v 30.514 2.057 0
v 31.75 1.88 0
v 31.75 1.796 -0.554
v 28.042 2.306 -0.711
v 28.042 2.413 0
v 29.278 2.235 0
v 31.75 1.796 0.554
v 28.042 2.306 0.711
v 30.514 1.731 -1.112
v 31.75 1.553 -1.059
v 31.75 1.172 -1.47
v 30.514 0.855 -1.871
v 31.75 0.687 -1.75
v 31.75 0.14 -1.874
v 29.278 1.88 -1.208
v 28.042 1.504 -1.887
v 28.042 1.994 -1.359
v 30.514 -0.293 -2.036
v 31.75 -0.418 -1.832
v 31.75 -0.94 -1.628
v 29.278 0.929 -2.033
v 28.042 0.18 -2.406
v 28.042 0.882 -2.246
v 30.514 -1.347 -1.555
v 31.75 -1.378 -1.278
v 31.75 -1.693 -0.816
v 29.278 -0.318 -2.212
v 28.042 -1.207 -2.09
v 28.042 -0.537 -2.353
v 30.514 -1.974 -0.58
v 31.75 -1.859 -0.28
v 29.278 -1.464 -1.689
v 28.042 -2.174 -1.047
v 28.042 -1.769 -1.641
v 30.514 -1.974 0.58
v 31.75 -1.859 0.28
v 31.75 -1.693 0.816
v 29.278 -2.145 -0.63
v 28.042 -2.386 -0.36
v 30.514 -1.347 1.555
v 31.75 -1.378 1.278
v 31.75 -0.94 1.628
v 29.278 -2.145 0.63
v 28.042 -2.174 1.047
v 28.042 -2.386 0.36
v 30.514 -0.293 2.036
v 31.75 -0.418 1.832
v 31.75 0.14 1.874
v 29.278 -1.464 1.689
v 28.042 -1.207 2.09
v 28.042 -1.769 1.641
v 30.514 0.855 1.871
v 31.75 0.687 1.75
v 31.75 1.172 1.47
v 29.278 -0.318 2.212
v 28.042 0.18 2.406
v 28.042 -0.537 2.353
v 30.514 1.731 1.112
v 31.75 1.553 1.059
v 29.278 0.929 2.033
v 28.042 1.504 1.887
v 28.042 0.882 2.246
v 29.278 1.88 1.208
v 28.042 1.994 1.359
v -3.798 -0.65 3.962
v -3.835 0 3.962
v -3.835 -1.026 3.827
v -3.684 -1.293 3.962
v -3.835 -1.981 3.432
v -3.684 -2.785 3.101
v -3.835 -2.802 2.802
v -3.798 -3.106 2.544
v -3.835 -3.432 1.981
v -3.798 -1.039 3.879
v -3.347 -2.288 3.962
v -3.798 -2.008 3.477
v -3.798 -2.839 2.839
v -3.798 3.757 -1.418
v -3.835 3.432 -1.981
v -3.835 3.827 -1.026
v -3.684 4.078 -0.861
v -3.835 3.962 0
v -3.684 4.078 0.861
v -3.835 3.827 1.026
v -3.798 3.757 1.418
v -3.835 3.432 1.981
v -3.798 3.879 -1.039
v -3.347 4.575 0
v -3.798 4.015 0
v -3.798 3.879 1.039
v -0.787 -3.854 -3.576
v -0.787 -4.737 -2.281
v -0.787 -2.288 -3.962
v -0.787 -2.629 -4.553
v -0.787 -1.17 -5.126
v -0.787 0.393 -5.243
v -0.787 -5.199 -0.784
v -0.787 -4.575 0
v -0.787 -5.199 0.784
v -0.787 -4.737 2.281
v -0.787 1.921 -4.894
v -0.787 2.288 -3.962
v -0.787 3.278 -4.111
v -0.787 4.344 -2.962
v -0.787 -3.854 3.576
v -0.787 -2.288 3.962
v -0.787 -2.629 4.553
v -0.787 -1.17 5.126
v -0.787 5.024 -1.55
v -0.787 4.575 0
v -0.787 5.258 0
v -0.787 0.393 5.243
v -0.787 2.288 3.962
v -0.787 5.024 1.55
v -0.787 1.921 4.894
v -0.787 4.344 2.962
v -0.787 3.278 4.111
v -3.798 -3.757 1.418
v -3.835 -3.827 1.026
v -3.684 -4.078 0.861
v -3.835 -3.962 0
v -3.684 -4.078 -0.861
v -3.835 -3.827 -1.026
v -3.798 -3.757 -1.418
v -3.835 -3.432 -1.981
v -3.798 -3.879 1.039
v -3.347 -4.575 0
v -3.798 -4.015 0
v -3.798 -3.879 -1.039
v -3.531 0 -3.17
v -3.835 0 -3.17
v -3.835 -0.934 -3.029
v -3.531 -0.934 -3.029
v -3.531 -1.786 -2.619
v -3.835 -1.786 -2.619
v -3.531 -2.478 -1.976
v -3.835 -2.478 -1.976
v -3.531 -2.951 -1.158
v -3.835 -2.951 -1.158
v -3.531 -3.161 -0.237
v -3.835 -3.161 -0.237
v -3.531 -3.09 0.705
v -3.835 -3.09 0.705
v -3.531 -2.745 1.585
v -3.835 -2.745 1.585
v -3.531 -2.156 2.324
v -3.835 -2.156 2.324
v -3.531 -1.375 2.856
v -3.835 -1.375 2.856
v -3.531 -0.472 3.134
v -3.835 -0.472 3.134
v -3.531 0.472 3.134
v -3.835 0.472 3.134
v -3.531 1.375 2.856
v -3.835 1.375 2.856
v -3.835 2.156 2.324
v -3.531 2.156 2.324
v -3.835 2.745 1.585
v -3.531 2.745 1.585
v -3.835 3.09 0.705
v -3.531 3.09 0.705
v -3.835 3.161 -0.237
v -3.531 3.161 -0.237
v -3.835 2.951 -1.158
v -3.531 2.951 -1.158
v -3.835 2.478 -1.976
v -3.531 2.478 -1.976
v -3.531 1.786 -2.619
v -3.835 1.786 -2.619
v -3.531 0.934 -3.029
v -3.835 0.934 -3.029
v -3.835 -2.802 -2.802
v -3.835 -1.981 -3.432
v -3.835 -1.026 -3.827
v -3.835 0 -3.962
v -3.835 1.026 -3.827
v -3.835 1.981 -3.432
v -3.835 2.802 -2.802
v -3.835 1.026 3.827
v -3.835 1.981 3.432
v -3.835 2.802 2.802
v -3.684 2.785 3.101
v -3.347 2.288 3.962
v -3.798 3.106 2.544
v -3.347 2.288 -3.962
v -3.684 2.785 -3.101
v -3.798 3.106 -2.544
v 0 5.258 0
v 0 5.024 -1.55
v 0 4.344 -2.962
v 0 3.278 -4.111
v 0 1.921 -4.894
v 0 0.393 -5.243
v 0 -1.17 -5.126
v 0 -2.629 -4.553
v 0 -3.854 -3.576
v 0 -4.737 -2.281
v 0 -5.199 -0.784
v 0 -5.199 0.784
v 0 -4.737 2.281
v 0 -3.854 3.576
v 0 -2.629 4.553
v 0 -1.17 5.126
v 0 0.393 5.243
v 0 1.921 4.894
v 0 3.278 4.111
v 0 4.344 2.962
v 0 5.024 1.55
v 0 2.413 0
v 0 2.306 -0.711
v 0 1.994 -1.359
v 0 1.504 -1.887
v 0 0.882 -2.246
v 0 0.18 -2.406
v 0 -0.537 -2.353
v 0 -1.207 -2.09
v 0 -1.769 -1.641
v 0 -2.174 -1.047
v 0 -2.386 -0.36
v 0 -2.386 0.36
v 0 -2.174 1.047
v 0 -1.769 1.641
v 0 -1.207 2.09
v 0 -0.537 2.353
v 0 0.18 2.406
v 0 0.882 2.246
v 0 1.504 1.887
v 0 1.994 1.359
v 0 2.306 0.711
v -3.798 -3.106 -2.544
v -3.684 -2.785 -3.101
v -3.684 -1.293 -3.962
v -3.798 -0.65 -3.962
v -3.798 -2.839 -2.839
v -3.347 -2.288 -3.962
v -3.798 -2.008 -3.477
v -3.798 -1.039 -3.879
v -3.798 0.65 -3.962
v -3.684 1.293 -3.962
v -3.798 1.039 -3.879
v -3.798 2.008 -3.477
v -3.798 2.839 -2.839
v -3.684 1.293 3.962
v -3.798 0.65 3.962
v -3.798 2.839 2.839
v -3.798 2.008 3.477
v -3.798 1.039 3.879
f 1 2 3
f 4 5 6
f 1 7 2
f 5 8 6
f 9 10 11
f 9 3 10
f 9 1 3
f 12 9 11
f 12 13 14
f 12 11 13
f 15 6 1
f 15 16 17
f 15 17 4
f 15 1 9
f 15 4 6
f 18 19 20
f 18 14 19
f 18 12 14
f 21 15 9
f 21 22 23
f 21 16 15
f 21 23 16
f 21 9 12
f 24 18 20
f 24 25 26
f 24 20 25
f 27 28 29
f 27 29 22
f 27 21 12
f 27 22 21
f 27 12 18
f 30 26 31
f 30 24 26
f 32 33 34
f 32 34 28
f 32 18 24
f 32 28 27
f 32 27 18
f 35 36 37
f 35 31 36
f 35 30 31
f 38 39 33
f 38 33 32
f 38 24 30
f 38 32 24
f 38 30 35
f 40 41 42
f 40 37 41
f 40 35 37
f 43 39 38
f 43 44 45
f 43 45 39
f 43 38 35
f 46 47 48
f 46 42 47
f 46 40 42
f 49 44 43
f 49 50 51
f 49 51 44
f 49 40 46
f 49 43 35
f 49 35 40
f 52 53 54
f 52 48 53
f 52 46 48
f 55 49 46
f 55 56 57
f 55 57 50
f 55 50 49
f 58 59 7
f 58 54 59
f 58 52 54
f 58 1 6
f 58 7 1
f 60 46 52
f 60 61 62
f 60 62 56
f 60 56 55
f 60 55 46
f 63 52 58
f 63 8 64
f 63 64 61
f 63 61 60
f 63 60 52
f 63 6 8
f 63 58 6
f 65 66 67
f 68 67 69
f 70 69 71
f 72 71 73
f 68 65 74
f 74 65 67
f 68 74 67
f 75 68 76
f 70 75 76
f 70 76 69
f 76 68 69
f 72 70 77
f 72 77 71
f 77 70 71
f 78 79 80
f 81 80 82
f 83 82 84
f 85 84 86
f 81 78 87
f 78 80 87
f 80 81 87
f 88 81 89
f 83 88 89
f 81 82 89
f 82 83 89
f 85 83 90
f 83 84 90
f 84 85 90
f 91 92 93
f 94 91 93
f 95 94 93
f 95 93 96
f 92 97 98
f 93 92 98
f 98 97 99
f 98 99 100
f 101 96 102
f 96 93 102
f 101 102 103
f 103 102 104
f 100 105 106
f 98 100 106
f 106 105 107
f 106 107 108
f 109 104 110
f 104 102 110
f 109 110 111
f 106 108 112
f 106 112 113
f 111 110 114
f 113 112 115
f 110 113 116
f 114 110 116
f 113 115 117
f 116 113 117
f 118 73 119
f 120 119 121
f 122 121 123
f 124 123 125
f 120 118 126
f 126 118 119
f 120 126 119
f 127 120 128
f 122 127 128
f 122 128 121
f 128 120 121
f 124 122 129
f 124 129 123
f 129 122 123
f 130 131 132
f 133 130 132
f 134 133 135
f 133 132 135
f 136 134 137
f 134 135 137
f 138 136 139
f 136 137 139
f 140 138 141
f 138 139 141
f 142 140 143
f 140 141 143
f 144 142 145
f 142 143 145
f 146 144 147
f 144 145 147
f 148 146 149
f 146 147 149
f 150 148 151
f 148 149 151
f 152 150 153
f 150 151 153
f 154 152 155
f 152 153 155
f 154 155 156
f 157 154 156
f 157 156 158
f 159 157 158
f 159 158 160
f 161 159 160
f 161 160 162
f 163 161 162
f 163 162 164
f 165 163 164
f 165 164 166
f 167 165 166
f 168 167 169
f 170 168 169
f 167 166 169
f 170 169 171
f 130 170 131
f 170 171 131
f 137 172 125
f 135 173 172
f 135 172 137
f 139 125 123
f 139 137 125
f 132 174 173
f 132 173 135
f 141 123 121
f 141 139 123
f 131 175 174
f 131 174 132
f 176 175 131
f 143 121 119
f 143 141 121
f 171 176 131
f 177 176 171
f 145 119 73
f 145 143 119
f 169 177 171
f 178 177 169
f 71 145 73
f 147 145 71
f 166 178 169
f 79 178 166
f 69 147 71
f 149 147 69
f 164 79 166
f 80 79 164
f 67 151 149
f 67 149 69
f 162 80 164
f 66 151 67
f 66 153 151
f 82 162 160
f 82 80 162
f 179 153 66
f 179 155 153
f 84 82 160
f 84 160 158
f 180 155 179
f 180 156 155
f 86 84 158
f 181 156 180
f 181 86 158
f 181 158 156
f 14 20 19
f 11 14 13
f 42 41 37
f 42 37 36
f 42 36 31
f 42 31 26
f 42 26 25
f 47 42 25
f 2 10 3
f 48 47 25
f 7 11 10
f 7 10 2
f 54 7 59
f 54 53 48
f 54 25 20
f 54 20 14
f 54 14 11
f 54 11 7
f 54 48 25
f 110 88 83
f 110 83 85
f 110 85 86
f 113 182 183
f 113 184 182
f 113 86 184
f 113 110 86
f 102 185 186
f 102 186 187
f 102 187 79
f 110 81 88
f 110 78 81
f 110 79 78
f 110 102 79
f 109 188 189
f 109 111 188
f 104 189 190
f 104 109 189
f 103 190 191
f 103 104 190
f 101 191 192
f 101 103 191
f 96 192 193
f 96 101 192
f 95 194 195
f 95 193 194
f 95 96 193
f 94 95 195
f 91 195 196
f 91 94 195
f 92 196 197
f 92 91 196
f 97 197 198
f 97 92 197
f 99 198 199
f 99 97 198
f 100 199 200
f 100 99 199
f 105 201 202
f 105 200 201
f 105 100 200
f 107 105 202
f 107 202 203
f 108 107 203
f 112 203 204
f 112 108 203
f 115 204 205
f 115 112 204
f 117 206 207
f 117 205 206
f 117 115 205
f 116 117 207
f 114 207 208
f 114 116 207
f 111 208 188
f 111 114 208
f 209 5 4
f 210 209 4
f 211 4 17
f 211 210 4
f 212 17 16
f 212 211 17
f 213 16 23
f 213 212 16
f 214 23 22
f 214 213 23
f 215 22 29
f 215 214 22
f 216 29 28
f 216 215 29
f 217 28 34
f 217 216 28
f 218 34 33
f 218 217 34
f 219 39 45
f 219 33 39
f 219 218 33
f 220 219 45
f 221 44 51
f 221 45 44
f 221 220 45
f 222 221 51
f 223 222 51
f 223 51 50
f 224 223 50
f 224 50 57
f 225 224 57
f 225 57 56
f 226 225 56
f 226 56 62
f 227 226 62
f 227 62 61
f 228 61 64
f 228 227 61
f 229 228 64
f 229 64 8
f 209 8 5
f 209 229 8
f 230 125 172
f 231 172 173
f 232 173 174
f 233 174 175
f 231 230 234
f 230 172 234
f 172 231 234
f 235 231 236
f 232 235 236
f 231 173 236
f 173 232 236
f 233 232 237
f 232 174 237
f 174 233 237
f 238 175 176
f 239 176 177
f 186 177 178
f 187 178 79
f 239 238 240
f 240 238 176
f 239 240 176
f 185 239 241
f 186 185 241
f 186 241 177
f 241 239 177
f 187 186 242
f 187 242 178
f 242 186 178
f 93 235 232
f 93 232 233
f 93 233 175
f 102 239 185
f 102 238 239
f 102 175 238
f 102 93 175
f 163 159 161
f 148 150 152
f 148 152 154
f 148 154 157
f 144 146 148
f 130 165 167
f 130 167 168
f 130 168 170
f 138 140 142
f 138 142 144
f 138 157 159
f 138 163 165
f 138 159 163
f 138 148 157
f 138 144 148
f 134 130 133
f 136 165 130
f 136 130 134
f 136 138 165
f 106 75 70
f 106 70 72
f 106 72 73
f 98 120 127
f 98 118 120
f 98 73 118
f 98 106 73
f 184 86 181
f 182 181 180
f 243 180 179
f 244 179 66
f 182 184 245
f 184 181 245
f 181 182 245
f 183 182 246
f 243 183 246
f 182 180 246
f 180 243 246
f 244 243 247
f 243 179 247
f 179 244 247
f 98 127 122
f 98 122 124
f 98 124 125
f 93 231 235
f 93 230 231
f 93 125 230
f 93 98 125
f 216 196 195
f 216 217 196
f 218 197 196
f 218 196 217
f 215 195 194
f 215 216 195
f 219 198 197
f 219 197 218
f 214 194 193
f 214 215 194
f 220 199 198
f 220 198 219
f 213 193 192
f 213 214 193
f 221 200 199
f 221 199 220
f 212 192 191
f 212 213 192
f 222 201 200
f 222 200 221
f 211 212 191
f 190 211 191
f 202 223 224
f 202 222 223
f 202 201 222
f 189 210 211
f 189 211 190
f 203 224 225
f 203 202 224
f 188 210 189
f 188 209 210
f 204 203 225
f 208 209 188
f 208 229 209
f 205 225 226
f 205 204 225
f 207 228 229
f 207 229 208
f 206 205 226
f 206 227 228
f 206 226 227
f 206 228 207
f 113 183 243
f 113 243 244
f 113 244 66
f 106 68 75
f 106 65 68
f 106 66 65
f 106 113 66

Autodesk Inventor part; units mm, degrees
ref_plane "YZ Plane" through (0, 0, 0) normal (1, 0, 0) x (0, 1, 0)
sketch "Sketch1" plane through (0, 0, 0) normal (0, 0, 1) x (1, 0, 0)
  line L0 (-0.7874, 5.2578) -> (-0.7874, 0)
  line L1 (-0.7874, 0) -> (31.75, 0)
  line L2 (31.75, 0) -> (31.75, 2.413)
  line L3 (31.75, 2.413) -> (0, 2.413)
  line L4 (0, 2.413) -> (0, 5.2578)
  line L5 (-7.2949, 0) -> (38.2575, 0) projected
  line L6 (0, -1.0516) -> (0, 6.3094) projected
  line L7 (0, 5.2578) -> (-0.7874, 5.2578)
  dimension "d1" = 0.7874
  dimension "d2" = 4.826
  dimension "d3" = 31.75
  dimension "d22" = 10.5156
revolve "Body" add sketch "Sketch1" angle 360 about axis through (-0.7874, 0, 0) along (1, 0, 0)
sketch "Sketch2" plane through (-0.7874, 0, 0) normal (-1, 0, 0) x (0, 0, 1)
  line L0 (0, 4.5754) -> (3.9624, 2.2877)
  line L1 (3.9624, 2.2877) -> (3.9624, -2.2877)
  line L2 (3.9624, -2.2877) -> (0, -4.5754)
  line L3 (0, -4.5754) -> (-3.9624, -2.2877)
  line L4 (-3.9624, -2.2877) -> (-3.9624, 2.2877)
  line L5 (-3.9624, 2.2877) -> (0, 4.5754)
  circle A0 centre (0, 0) radius 5.2578 projected
  dimension "d11" = 7.9248
extrude "Head" add sketch "Sketch2" along normal blind 3.048 contours L0 L1 L2 L3 L4 L5
ref_plane "IDS_WORKPLANE{1}" through (-3.8354, 0, 0) normal (-1, 0, 0) x (0, 0, -1)
sketch "Sketch3" plane through (-3.8354, 0, 0) normal (-1, 0, 0) x (0, 0, -1)
  circle A0 centre (0, 0) radius 3.1699
  point P0 (0, 0)
  dimension "d15" = 6.3398
extrude "Indent" cut sketch "Sketch3" against normal blind 0.3048
thread "Thread" size "10-24 UNC" class "2A" standard "ANSI Unified Screw Threads" length 31.75
sketch "Sketch4" plane through (0, 0, 0) normal (0, 0, 1) x (1, 0, 0)
  line L0 (-3.8354, 3.9624) -> (-3.8354, 4.5754)
  line L1 (-3.8354, 4.5754) -> (-3.3472, 4.5754)
  line L2 (-3.8354, 4.5754) -> (-3.8354, 2.2877) projected
  line L3 (-4.9666, 0) -> (2.8908, 0) projected
  line L4 (-0.7874, 4.5754) -> (-3.8354, 4.5754) projected
  arc A0 (-3.3472, 4.5754) -> (-3.8354, 3.9624) centre (1.7683, 0) ccw
  dimension "d21" = 7.9248
  dimension "d23" = 6.8631
revolve "Chamfer1" cut sketch "Sketch4" angle 360 about axis through (-10, 0, 0) along (1, 0, 0)
chamfer "Chamfer2" distance 0.5334 distance2 3.7084 1 edges at (31.75, -2.413, 0) measured on face at (31.75, 0.5787, 0.3409)
ref_plane "Work Plane3" through (7, 0, 0) normal (0, 0, -1) x (1, 0, 0)
equation "\"d1\" = SD"
equation "\"d2\" = NND"
equation "\"d3\" = NLG"
equation "\"d22\" = SD2"
equation "\"d11\" = SW"
equation "\"d12\" = KOH"
equation "\"d15\" = SD3"
equation "\"d16\" = SB"
equation "\"d21\" = SW"
equation "\"d23\" = 0.866025 * SW"
equation "\"d6\" = GEL"
equation "\"d19\" = -0.5 * GD2 + 0.5 * NND"
equation "\"d20\" = SPTZ"
equation "\"NLG\" = 31.75"
equation "\"NND\" = 4.826"
equation "\"KOH\" = 3.048"
equation "\"GEL\" = 31.75"
equation "\"SW\" = 7.9248"
equation "\"GD2\" = 3.7592"
equation "\"SPTZ\" = 3.7084"
equation "\"SD3\" = 0.8 * SW"
equation "\"SB\" = 0.1 * KOH"
equation "\"SD2\" = 10.5156"
equation "\"SD\" = 0.7874"
equation "\"GD1\" = 3.7592"
equation "\"THREADDIA\" = 4.826"
equation "\"TOA\" = 30deg"
equation "\"E0\" = 9.15077"
properties part number "am-1266" material "Steel, Mild"
